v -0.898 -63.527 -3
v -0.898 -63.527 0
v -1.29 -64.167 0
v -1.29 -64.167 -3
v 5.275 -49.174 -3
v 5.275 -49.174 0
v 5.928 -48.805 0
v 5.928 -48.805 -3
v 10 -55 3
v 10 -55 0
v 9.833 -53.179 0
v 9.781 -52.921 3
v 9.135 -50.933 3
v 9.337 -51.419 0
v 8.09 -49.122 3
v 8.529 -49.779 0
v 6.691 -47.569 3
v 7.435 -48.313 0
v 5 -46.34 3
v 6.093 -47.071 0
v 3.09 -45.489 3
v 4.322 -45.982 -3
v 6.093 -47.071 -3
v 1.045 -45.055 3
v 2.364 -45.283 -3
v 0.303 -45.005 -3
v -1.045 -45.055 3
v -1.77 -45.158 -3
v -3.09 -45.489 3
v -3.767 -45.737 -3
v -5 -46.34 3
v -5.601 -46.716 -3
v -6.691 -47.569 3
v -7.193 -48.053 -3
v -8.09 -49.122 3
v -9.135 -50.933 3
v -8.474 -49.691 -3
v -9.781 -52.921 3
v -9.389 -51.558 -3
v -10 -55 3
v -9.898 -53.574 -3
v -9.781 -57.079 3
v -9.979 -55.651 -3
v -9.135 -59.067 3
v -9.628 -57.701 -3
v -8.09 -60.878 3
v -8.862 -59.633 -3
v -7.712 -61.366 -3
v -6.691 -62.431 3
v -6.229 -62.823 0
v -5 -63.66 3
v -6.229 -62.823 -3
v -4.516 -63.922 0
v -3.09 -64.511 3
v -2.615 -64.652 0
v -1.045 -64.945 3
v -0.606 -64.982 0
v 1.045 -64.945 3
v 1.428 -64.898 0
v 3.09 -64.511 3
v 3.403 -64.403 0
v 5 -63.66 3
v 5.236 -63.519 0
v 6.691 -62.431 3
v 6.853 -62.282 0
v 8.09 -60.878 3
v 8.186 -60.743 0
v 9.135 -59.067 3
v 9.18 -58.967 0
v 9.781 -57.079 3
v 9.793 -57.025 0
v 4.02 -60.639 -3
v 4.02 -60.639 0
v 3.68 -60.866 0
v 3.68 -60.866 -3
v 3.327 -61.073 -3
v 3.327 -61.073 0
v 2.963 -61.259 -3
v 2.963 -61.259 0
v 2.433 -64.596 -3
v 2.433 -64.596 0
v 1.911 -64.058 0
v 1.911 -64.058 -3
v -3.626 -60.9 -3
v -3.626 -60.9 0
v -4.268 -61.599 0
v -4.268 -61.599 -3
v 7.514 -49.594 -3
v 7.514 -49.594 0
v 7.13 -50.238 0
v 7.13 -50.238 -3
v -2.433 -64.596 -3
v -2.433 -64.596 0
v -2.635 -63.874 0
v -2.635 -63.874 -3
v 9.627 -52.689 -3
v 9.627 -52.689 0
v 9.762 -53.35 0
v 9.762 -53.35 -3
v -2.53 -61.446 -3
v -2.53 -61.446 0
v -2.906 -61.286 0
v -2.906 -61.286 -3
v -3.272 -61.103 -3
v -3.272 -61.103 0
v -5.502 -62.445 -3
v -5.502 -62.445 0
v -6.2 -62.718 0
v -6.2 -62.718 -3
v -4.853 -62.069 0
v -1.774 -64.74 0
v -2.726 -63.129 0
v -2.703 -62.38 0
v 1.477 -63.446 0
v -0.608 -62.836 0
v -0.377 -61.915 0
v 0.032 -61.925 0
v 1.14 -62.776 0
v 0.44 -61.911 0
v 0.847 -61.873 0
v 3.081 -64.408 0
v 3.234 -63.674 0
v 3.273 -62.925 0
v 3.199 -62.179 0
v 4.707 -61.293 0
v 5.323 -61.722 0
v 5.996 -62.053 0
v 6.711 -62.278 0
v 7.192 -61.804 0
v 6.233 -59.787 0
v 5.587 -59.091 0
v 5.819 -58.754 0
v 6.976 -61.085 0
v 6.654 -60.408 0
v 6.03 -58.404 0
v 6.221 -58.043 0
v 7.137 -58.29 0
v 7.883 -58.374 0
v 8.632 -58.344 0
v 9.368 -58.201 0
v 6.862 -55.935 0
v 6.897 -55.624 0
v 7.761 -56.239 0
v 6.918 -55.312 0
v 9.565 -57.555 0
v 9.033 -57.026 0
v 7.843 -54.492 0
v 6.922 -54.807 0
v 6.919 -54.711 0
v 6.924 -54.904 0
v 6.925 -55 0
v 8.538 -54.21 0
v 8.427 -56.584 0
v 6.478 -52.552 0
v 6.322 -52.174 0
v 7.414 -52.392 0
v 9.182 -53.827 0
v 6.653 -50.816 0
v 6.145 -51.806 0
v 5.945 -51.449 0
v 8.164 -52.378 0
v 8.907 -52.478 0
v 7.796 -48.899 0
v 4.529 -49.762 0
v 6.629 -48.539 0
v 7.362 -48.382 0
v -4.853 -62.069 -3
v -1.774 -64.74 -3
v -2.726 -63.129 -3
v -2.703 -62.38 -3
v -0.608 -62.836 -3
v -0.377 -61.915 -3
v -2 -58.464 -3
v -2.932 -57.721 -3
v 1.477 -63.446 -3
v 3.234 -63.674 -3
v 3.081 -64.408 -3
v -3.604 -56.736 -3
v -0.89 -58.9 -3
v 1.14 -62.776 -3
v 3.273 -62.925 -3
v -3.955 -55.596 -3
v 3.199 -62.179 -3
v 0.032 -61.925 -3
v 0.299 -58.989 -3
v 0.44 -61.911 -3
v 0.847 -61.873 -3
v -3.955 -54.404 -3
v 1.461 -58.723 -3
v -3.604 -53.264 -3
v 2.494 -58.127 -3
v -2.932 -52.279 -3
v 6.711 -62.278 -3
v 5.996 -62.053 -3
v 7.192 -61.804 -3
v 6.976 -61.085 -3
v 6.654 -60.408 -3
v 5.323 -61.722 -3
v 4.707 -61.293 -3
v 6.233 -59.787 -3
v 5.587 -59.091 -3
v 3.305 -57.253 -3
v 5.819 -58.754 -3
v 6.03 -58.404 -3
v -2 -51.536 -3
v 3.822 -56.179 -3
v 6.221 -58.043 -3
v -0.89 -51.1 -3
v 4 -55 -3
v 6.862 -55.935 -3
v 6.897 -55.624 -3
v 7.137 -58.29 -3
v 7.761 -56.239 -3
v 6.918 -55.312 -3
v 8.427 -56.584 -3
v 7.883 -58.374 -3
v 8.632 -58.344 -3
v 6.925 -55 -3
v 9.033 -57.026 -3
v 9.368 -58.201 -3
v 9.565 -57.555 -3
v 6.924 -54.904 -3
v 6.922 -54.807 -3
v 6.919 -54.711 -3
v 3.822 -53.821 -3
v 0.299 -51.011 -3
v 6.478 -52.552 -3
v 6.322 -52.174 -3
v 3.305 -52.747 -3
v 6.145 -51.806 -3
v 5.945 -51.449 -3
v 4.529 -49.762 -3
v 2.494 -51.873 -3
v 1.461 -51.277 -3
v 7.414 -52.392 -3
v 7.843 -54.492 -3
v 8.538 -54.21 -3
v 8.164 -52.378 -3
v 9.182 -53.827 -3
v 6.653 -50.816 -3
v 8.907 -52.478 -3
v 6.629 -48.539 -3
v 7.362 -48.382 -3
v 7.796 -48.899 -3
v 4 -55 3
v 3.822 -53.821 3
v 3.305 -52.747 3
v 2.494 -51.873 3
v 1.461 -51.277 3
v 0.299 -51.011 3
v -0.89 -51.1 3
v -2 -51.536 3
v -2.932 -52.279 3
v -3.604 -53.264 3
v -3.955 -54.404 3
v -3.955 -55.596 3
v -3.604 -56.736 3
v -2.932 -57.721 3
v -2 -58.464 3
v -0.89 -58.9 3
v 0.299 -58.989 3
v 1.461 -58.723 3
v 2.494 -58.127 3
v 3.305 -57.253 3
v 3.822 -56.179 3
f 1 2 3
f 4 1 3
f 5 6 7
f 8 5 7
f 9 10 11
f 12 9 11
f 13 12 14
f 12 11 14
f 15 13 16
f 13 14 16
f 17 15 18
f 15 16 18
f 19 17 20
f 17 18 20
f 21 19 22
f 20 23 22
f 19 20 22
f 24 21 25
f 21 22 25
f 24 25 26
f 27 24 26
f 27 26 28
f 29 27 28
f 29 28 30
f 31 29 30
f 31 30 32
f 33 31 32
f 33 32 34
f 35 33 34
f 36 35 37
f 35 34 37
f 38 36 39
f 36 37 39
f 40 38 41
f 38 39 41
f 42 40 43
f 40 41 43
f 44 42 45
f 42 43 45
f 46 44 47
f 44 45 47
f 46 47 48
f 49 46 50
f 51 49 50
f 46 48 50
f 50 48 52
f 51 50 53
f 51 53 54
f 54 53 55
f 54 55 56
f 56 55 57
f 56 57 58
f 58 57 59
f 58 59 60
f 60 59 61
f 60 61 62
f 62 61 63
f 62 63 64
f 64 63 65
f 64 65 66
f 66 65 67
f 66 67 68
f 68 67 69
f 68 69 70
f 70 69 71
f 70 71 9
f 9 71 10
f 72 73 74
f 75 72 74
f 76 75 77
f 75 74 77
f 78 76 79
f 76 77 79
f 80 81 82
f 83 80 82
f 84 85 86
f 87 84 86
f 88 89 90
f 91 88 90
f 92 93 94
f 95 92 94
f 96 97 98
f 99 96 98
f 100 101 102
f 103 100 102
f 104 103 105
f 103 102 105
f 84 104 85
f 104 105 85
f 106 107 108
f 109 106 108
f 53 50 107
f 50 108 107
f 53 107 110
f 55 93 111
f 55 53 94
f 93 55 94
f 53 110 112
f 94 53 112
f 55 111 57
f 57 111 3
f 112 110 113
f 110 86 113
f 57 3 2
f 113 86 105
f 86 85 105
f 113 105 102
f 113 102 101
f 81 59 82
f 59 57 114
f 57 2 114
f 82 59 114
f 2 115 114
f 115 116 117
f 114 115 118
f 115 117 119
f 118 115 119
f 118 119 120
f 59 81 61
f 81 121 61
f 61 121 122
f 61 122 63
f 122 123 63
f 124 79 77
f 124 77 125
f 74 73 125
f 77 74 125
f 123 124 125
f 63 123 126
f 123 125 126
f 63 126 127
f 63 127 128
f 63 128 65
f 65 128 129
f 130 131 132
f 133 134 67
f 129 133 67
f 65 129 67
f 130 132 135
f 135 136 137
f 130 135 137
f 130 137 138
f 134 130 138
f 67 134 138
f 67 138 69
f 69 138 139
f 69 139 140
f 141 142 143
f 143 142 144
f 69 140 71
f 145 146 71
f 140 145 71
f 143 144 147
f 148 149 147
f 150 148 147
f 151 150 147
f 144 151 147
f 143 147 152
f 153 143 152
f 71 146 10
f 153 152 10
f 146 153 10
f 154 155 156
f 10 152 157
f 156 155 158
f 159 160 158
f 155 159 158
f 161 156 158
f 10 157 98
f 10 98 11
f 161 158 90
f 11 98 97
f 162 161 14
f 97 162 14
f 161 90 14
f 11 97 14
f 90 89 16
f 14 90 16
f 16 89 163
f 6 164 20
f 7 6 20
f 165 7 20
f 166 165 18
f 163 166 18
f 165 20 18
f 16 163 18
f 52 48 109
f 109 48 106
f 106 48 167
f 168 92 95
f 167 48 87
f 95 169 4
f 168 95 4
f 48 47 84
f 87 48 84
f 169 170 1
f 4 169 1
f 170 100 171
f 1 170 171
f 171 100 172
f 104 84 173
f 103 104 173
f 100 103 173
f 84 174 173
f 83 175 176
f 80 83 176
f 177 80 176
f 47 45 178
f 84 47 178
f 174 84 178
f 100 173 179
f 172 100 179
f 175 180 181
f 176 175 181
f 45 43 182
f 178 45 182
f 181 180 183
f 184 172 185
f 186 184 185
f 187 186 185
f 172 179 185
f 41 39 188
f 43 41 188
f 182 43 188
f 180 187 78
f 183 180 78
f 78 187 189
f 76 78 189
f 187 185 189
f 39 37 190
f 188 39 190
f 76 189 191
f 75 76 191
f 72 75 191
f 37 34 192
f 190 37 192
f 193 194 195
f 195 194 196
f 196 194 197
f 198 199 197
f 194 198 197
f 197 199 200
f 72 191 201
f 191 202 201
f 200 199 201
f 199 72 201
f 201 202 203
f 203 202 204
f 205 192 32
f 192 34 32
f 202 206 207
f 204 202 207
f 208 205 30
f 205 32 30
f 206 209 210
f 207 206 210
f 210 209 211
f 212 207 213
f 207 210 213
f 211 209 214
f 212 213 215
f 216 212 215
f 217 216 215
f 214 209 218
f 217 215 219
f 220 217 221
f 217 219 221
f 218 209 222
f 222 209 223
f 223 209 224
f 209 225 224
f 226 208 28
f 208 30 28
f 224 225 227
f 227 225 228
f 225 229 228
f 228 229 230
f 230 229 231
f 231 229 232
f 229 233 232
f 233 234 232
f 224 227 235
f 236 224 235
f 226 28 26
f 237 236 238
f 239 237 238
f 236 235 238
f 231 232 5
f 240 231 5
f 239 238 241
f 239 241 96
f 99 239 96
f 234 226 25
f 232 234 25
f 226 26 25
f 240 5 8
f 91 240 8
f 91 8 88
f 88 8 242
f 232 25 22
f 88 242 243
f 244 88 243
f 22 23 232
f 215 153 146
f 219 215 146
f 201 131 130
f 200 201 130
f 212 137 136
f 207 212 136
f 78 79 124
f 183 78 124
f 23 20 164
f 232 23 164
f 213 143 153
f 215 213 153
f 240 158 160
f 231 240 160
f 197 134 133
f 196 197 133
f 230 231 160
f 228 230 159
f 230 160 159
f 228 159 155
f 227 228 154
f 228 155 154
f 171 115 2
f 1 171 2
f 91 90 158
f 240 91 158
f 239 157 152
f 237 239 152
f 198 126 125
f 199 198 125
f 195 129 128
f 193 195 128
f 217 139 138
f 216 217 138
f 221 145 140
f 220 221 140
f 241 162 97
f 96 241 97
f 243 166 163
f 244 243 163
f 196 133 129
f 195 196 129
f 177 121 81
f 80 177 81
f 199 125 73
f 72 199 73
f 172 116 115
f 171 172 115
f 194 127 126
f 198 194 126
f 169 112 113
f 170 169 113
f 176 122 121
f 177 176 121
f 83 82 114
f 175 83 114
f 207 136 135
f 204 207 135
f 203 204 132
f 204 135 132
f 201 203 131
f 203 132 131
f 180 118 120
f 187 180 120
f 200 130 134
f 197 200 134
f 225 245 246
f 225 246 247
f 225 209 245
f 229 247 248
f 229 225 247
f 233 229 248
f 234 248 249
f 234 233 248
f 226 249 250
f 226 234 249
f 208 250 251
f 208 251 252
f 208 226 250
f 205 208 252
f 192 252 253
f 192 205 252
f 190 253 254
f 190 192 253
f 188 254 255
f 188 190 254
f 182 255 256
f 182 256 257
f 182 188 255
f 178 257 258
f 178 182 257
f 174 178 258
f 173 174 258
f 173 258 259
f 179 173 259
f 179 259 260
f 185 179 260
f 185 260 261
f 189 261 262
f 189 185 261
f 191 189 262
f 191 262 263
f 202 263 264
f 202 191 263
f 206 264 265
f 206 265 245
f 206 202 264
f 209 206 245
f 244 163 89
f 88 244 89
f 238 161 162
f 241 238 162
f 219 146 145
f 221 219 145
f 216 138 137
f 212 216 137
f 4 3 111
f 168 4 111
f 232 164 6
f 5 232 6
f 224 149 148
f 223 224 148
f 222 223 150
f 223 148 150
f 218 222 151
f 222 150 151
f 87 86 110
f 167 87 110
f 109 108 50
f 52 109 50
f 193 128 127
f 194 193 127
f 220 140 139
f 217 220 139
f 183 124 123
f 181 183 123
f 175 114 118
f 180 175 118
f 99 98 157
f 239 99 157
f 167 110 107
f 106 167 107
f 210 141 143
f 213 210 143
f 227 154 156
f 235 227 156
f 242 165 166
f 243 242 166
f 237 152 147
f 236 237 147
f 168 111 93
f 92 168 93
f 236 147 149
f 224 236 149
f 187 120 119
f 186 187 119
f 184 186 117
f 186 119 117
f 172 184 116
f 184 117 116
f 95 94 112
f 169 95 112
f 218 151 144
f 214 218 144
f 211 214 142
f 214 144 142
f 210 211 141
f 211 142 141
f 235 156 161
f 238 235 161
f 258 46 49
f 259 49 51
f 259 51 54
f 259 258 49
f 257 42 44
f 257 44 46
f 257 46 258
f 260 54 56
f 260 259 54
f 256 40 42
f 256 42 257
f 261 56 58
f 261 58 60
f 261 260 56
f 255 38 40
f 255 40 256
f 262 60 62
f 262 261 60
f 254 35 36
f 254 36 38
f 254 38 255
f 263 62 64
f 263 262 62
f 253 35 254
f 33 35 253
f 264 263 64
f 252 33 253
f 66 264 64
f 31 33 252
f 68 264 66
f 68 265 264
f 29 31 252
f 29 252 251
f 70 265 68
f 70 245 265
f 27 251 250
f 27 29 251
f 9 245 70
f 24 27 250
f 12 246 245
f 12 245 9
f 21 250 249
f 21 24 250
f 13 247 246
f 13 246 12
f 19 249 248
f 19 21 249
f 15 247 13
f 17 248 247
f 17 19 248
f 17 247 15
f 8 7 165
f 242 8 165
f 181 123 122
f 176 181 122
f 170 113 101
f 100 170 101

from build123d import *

# Parameters (mm, degrees)
F0_R     = 10
F0_R_2   = 4
F1_DEPTH = 3
F3_DEPTH = 25
F4_DEPTH = 3


# Not quite as in the source:
# - a feature names something its author has since deleted; it is built from what else it names


with BuildPart() as f1:
    # F0 (on Top) → F1 (new body)
    with BuildSketch(Plane.XY):
        with Locations((0, -55)):
            Circle(F0_R)
        with Locations((0, -55)):
            Circle(F0_R_2, mode=Mode.SUBTRACT)
    extrude(amount=-F1_DEPTH)

    # F2 (on face) → F3 (cut)
    with BuildSketch(Plane.XY):
        with BuildLine():
            ThreePointArc((6.918967171, -54.711004694), (6.9234916285, -54.8554708664), (6.925, -55))
            ThreePointArc((6.925, -55), (6.9091405252, -55.4684038892), (6.8616347427, -55.9346623229))
            Line((6.8616347427, -55.9346623229), (7.7608112736, -56.2391925528))
            Line((7.7608112736, -56.2391925528), (8.4266122732, -56.5844591584))
            Line((8.4266122732, -56.5844591584), (9.0325271812, -57.0264626926))
            Line((9.0325271812, -57.0264626926), (9.5646125465, -57.5550316702))
            Line((9.5646125465, -57.5550316702), (9.3682753061, -58.2008464176))
            Line((9.3682753061, -58.2008464176), (8.6320298332, -58.3438240508))
            Line((8.6320298332, -58.3438240508), (7.8826287699, -58.373791473))
            Line((7.8826287699, -58.373791473), (7.1373175032, -58.2900590671))
            Line((7.1373175032, -58.2900590671), (6.2207936805, -58.0425895196))
            ThreePointArc((6.2207936805, -58.0425895196), (5.9273034064, -58.5808796864), (5.5873528695, -59.0911016746))
            Line((5.5873528695, -59.0911016746), (6.2328020031, -59.7872715608))
            Line((6.2328020031, -59.7872715608), (6.6536597658, -60.4080603684))
            Line((6.6536597658, -60.4080603684), (6.9757740672, -61.0853656001))
            Line((6.9757740672, -61.0853656001), (7.1917323401, -61.8036009545))
            Line((7.1917323401, -61.8036009545), (6.7114037747, -62.2778471661))
            Line((6.7114037747, -62.2778471661), (5.9959787098, -62.0527539043))
            Line((5.9959787098, -62.0527539043), (5.322833198, -61.722034809))
            Line((5.322833198, -61.722034809), (4.7074578164, -61.2933004628))
            Line((4.7074578164, -61.2933004628), (4.0195694603, -60.6390323951))
            ThreePointArc((4.0195694603, -60.6390323951), (3.5050568866, -60.9724535345), (2.9630704597, -61.2590605087))
            Line((2.9630704597, -61.2590605087), (3.1988405858, -62.1786634351))
            Line((3.1988405858, -62.1786634351), (3.2730686388, -62.9249811932))
            Line((3.2730686388, -62.9249811932), (3.2335539791, -63.673939531))
            Line((3.2335539791, -63.673939531), (3.0812059272, -64.4083032495))
            Line((3.0812059272, -64.4083032495), (2.4329416781, -64.5963948851))
            Line((2.4329416781, -64.5963948851), (1.9111960197, -64.0576171313))
            Line((1.9111960197, -64.0576171313), (1.476949591, -63.4461189391))
            Line((1.476949591, -63.4461189391), (1.1401953689, -62.7759722433))
            Line((1.1401953689, -62.7759722433), (0.8471481357, -61.8729880719))
            ThreePointArc((0.8471481357, -61.8729880719), (0.2359283481, -61.9209799028), (-0.3771407279, -61.9147226894))
            Line((-0.3771407279, -61.9147226894), (-0.6080157262, -62.8355667749))
            Line((-0.6080157262, -62.8355667749), (-0.898352157, -63.5270902792))
            Line((-0.898352157, -63.5270902792), (-1.2899483564, -64.1667405091))
            Line((-1.2899483564, -64.1667405091), (-1.773792824, -64.7397976887))
            Line((-1.773792824, -64.7397976887), (-2.4333609662, -64.5962885747))
            Line((-2.4333609662, -64.5962885747), (-2.6353644947, -63.8740042993))
            Line((-2.6353644947, -63.8740042993), (-2.7257904358, -63.1294754891))
            Line((-2.7257904358, -63.1294754891), (-2.7025578872, -62.3798354097))
            Line((-2.7025578872, -62.3798354097), (-2.5299587465, -61.4463116385))
            ThreePointArc((-2.5299587465, -61.4463116385), (-3.0902045366, -61.1972785093), (-3.6262282301, -60.8996689588))
            Line((-3.6262282301, -60.8996689588), (-4.267964983, -61.5992624369))
            Line((-4.267964983, -61.5992624369), (-4.852715623, -62.0689077169))
            Line((-4.852715623, -62.0689077169), (-5.5017769863, -62.4446993436))
            Line((-5.5017769863, -62.4446993436), (-6.2002127258, -62.7179895151))
            Line((-6.2002127258, -62.7179895151), (-6.2293167628, -62.8227624704))
            ThreePointArc((-6.2293167628, -62.8227624704), (4.3420520709, -64.0081398643), (10, -55))
            ThreePointArc((10, -55), (8.9702732091, -50.5802490393), (6.093160289, -47.0707252733))
            Line((6.093160289, -47.0707252733), (4.5292177041, -49.7615067062))
            Line((4.5292177041, -49.7615067062), (5.2752674988, -49.1744234085))
            Line((5.2752674988, -49.1744234085), (5.9280342708, -48.8051057384))
            Line((5.9280342708, -48.8051057384), (6.6291535281, -48.5387755166))
            Line((6.6291535281, -48.5387755166), (7.3624909556, -48.3815615944))
            Line((7.3624909556, -48.3815615944), (7.7963725922, -48.8986415935))
            Line((7.7963725922, -48.8986415935), (7.5142043948, -49.5935380667))
            Line((7.5142043948, -49.5935380667), (7.1301722462, -50.2377579894))
            Line((7.1301722462, -50.2377579894), (6.653113581, -50.8164764269))
            Line((6.653113581, -50.8164764269), (5.9453992104, -51.4492461041))
            ThreePointArc((5.9453992104, -51.4492461041), (6.2361540084, -51.9890187341), (6.4780276654, -52.552392481))
            Line((6.4780276654, -52.552392481), (7.4136750809, -52.3917033141))
            Line((7.4136750809, -52.3917033141), (8.1635503464, -52.3780253684))
            Line((8.1635503464, -52.3780253684), (8.9068663995, -52.4779315504))
            Line((8.9068663995, -52.4779315504), (9.6265178829, -52.6891227965))
            Line((9.6265178829, -52.6891227965), (9.7616104212, -53.350466131))
            Line((9.7616104212, -53.350466131), (9.1824341074, -53.8269688042))
            Line((9.1824341074, -53.8269688042), (8.5378456767, -54.2103820995))
            Line((8.5378456767, -54.2103820995), (7.8426785438, -54.4918828231))
            Line((7.8426785438, -54.4918828231), (6.918967171, -54.711004694))
        make_face()
    extrude(amount=-F3_DEPTH, mode=Mode.SUBTRACT)

    # F0 (on Top) → F4 (join)
    with BuildSketch(Plane.XY):
        with Locations((0, -55)):
            Circle(F0_R)
        with Locations((0, -55)):
            Circle(F0_R_2, mode=Mode.SUBTRACT)
    extrude(amount=F4_DEPTH)


solid = f1.part
